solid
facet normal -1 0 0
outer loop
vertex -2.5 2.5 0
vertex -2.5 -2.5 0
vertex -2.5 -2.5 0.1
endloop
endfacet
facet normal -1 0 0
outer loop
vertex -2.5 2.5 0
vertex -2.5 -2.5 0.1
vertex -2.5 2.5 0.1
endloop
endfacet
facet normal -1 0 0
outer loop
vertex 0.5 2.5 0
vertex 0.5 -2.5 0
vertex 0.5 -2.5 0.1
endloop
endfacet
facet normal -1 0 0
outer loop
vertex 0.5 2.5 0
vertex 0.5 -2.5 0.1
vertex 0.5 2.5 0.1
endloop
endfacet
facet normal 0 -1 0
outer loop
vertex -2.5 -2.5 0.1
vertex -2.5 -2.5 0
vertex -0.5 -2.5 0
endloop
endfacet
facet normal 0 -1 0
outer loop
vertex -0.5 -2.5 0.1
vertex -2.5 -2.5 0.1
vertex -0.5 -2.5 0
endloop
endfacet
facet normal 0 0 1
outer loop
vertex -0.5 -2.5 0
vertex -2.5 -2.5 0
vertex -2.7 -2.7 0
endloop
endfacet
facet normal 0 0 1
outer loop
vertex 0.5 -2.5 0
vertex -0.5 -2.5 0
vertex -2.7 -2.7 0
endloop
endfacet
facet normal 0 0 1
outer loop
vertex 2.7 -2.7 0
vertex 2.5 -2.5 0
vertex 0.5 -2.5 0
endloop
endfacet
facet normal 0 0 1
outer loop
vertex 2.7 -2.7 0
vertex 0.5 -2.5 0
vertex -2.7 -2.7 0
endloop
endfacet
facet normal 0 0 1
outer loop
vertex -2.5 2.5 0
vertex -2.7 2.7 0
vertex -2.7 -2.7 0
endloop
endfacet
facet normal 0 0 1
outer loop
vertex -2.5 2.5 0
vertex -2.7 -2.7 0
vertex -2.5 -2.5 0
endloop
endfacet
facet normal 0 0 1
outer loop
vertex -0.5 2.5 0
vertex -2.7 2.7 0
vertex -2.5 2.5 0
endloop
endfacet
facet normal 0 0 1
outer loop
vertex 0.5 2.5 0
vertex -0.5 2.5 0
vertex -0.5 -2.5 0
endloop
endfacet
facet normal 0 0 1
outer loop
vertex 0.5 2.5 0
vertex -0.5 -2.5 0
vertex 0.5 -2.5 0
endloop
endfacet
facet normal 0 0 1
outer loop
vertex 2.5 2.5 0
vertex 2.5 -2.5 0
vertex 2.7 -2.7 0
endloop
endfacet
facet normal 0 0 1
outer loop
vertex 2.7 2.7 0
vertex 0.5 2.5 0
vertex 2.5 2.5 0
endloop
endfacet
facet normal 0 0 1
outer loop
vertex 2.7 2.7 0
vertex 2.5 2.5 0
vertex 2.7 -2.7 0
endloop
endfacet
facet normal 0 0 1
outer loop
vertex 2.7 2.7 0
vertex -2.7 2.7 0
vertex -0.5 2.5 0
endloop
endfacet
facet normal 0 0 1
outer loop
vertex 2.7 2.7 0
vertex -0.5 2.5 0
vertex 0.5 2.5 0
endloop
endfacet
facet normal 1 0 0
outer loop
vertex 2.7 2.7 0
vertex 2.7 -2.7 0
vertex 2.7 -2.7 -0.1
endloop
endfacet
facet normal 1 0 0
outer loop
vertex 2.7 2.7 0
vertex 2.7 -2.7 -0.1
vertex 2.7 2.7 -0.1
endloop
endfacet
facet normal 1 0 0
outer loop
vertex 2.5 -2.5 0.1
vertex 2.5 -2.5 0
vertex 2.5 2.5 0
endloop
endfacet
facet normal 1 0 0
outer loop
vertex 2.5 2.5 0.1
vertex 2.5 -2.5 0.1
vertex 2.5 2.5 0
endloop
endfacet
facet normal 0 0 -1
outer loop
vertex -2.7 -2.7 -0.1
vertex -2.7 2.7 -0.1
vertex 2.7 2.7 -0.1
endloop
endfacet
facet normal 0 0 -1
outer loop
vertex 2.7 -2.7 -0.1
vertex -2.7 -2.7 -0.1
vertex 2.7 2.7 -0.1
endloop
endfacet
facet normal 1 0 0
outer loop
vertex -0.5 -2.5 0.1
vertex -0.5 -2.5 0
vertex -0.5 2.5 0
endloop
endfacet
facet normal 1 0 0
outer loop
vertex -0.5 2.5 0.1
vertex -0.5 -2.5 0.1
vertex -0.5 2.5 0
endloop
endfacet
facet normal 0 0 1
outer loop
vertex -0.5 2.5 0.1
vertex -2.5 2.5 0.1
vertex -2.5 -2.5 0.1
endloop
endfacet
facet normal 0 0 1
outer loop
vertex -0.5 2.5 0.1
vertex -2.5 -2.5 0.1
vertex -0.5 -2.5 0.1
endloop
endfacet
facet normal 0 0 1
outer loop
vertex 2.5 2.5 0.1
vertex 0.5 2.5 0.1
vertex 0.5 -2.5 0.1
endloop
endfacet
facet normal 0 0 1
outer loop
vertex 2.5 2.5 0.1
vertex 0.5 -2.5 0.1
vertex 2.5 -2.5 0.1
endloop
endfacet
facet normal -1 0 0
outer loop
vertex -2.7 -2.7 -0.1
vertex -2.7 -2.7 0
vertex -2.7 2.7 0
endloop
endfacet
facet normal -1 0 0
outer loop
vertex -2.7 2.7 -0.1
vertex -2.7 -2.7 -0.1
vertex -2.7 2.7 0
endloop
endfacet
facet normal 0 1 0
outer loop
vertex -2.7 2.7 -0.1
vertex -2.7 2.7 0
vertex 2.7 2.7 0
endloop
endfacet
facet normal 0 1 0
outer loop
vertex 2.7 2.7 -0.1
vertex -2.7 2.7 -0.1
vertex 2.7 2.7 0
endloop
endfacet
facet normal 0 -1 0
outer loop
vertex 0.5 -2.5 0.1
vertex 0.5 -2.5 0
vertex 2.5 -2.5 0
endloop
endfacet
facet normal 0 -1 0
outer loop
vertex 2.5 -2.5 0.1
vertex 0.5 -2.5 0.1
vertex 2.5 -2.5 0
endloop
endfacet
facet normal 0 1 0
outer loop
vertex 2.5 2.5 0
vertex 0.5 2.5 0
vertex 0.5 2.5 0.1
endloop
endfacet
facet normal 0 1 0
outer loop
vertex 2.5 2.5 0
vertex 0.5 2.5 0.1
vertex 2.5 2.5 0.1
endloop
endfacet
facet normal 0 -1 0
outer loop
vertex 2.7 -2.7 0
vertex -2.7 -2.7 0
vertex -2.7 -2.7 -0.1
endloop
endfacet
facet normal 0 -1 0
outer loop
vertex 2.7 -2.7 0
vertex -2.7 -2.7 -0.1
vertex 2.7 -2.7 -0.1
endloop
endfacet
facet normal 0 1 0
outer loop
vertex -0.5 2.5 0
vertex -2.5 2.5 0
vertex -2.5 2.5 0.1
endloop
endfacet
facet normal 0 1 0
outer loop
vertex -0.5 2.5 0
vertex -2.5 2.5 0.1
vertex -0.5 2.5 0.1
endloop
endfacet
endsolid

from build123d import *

# Parameters (mm, degrees)
F0_W     = 5.4
F0_H     = 5.4
F0_W_2   = 2
F0_H_2   = 5
F1_DEPTH = 0.1
F2_DEPTH = 0.1


with BuildPart() as f1:
    # F0 (on Top) → F1 (new body)
    with BuildSketch(Plane.XY):
        Rectangle(F0_W, F0_H)
        with Locations((-1.5, 0)):
            Rectangle(F0_W_2, F0_H_2, mode=Mode.SUBTRACT)
        with Locations((1.5, 0)):
            Rectangle(F0_W_2, F0_H_2, mode=Mode.SUBTRACT)
        with Locations((-1.5, 0)):
            Rectangle(F0_W_2, F0_H_2)
        with Locations((1.5, 0)):
            Rectangle(F0_W_2, F0_H_2)
    extrude(amount=-F1_DEPTH)

    # F0 (on Top) → F2 (join)
    with BuildSketch(Plane.XY):
        with Locations((-1.5, 0)):
            Rectangle(F0_W_2, F0_H_2)
        with Locations((1.5, 0)):
            Rectangle(F0_W_2, F0_H_2)
    extrude(amount=F2_DEPTH)


solid = f1.part
